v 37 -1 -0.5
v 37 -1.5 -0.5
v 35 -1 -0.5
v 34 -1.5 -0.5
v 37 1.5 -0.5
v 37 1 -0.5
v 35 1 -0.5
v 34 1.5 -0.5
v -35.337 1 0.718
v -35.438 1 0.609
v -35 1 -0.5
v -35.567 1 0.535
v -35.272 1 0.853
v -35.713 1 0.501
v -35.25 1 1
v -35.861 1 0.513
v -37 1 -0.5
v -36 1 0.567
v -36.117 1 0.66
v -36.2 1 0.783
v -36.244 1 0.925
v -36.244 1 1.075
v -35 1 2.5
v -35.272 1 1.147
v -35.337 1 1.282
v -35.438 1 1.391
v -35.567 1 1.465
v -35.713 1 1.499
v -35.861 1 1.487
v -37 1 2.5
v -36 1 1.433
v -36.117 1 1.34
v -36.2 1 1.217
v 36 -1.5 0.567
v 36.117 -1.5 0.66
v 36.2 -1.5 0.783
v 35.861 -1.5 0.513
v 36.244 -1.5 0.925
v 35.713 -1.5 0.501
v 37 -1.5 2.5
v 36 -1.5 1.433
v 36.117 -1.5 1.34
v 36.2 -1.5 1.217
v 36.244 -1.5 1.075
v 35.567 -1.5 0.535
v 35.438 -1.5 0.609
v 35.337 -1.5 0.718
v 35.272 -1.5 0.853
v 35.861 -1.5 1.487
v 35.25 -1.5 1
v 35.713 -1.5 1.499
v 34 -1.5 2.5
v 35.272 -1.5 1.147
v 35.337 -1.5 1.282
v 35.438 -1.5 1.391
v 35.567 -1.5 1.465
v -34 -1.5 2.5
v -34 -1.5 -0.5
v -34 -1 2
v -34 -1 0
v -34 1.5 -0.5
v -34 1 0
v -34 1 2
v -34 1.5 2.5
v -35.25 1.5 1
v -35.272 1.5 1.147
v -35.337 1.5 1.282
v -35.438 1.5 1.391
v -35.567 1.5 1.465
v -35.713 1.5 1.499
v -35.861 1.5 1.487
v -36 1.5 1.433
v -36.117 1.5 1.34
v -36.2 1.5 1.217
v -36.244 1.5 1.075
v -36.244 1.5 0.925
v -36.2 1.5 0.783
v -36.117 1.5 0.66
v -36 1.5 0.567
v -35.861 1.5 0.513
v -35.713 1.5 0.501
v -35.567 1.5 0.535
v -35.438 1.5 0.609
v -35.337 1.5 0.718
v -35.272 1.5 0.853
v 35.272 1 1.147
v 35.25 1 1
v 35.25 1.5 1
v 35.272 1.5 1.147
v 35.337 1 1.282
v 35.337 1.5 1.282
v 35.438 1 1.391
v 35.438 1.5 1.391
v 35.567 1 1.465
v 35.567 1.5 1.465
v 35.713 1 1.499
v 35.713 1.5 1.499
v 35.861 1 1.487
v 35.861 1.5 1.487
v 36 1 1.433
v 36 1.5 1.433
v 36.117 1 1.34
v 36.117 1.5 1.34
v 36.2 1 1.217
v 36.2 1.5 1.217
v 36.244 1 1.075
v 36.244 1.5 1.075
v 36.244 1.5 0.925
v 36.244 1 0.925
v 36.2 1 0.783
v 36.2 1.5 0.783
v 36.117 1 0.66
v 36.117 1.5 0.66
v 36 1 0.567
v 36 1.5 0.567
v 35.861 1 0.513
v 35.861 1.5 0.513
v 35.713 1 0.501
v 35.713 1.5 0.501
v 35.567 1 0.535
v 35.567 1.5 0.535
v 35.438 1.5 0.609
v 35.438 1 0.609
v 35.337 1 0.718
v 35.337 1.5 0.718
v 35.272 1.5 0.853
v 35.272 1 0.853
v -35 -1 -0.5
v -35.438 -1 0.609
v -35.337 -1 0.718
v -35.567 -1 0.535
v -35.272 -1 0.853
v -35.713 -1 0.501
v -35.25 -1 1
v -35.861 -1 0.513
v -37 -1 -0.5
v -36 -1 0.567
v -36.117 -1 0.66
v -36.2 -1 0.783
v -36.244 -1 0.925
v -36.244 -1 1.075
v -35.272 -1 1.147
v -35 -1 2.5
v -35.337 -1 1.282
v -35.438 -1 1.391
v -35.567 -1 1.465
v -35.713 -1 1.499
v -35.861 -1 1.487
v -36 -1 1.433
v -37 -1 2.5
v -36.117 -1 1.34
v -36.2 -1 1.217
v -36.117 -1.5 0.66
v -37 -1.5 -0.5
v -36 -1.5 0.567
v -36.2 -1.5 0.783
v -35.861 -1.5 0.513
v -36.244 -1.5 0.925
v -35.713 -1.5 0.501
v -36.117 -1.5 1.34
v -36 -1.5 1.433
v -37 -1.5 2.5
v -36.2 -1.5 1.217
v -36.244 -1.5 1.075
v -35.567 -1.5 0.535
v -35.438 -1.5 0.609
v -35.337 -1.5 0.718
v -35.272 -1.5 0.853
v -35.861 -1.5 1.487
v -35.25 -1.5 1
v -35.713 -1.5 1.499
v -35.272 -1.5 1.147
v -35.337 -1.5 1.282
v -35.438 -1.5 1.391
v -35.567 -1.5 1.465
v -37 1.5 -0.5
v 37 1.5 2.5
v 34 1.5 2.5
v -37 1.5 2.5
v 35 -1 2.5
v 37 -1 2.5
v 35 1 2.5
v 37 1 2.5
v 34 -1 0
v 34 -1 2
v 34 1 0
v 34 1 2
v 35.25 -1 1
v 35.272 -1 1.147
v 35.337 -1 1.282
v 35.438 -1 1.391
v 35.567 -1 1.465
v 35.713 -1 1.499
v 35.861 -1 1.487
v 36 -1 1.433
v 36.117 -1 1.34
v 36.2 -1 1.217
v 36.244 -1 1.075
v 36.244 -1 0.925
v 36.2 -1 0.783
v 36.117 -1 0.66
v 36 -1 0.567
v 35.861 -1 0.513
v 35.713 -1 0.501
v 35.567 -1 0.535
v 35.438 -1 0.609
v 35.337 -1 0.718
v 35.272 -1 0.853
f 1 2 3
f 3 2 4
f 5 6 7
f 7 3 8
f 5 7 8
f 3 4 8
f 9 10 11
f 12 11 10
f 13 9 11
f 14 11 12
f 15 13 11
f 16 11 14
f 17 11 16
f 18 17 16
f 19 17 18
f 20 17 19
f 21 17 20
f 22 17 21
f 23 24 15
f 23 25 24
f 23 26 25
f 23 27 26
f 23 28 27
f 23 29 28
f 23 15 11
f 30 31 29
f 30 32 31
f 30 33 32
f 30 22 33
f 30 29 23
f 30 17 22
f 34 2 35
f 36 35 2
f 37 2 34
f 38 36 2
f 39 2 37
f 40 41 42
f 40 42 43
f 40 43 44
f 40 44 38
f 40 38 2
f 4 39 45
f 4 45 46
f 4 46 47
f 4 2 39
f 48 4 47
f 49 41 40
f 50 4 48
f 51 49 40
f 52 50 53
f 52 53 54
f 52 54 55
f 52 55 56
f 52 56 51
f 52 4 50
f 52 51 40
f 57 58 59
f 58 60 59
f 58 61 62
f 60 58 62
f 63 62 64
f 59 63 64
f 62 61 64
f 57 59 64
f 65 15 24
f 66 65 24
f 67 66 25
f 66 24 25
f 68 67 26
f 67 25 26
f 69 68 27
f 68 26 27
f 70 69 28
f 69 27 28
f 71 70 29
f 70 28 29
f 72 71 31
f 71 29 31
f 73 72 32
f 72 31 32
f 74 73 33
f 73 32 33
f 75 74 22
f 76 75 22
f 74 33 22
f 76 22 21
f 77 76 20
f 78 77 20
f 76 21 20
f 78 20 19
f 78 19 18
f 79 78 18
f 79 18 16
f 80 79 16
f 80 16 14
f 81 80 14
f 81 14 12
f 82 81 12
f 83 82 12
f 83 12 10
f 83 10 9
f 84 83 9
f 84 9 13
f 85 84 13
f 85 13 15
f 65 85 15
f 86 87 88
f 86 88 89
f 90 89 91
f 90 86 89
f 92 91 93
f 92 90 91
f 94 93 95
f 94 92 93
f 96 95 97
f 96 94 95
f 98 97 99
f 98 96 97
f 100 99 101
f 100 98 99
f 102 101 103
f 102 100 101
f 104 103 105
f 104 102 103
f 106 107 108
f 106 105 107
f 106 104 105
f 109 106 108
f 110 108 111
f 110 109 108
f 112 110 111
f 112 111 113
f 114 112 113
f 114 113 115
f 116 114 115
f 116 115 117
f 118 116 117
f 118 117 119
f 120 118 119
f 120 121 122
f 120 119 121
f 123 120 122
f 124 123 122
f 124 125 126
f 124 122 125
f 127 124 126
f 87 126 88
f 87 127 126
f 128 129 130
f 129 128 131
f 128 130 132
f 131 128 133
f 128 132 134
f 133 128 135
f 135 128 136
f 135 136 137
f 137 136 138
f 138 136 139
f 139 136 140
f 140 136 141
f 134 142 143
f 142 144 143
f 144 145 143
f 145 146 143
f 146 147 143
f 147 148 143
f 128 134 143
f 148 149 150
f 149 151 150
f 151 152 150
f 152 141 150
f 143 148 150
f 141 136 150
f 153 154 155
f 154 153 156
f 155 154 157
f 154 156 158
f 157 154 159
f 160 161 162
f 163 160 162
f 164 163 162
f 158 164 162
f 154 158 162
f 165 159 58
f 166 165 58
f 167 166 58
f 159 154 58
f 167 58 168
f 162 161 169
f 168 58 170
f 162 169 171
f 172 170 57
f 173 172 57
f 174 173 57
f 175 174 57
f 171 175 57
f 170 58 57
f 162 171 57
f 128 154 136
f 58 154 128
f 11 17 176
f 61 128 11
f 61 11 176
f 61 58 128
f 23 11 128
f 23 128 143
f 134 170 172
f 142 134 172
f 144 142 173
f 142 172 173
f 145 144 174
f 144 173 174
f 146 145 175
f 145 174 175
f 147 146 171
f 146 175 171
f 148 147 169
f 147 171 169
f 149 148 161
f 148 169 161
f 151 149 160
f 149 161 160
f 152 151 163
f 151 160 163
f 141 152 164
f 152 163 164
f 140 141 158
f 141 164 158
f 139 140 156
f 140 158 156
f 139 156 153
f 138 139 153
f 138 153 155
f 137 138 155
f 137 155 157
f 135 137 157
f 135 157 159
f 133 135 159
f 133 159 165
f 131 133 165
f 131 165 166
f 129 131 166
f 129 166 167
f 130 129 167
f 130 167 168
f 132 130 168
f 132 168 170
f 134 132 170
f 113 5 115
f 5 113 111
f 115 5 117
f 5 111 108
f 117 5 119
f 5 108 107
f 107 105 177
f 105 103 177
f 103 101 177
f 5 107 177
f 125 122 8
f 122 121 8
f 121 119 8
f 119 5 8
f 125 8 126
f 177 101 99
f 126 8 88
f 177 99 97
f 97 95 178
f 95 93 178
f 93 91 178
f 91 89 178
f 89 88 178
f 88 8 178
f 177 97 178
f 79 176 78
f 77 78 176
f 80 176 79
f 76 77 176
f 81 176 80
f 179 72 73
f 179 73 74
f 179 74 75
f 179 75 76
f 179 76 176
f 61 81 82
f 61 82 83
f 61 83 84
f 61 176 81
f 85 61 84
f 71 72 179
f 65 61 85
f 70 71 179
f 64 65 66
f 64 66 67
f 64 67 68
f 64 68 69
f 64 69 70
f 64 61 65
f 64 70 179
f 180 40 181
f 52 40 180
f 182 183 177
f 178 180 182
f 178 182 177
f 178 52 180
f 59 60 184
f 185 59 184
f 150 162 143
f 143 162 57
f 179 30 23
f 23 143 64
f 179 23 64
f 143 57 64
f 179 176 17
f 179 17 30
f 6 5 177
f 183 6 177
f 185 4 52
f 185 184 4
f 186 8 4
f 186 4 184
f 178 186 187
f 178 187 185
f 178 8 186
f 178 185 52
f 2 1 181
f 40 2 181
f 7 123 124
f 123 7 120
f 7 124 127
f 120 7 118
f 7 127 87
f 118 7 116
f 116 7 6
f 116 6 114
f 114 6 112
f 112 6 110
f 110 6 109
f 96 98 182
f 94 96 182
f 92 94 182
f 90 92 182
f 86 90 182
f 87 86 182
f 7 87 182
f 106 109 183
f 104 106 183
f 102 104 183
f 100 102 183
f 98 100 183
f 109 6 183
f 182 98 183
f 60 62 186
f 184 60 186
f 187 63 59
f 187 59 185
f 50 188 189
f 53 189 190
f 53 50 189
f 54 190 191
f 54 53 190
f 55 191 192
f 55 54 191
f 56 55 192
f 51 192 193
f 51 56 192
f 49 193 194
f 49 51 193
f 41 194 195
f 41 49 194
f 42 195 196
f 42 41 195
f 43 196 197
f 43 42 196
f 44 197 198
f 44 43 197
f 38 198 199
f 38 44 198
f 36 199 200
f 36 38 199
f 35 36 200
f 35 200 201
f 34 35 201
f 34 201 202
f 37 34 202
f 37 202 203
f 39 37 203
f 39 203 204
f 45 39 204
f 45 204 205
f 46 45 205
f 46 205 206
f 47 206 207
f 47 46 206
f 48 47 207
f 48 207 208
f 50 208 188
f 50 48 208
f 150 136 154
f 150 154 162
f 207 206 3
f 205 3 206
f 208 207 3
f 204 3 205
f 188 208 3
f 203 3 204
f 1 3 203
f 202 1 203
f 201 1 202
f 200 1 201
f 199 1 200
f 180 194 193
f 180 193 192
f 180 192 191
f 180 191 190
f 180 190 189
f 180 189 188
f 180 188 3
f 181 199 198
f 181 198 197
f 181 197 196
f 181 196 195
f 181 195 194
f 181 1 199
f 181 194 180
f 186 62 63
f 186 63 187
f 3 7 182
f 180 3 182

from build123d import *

# Parameters (mm, degrees)
IZIM1_W                     = 68
IZIM1_H                     = 2
Y_KSEKLIK_EKSTR_ZYON1_DEPTH = 2
IZIM2_W                     = 3
IZIM2_H                     = 3
Y_KSEKLIK_EKSTR_ZYON2_DEPTH = 3
IZIM3_W                     = 4.320543075
IZIM3_H                     = 2
KES_EKSTR_ZYON2_DEPTH       = 2
IZIM4_R                     = 0.5
KES_EKSTR_ZYON3_DEPTH       = 4


with BuildPart() as part:
    # Çizim1 → Yükseklik-Ekstrüzyon1 (new body)
    with BuildSketch(Plane.XY):
        Rectangle(IZIM1_W, IZIM1_H)
    extrude(amount=Y_KSEKLIK_EKSTR_ZYON1_DEPTH)

    # Çizim2 → Yükseklik-Ekstrüzyon2 (add)
    with BuildSketch(Plane.ZY.offset(34)):
        with Locations((1, 0)):
            Rectangle(IZIM2_W, IZIM2_H)
    y_kseklik_ekstr_zyon2 = extrude(amount=Y_KSEKLIK_EKSTR_ZYON2_DEPTH)

    # Çizim3 → Kes-Ekstrüzyon2 (cut)
    with BuildSketch(Plane.ZY.offset(37)):
        with Locations((1.085555309, 0)):
            Rectangle(IZIM3_W, IZIM3_H)
    kes_ekstr_zyon2 = extrude(amount=-KES_EKSTR_ZYON2_DEPTH, mode=Mode.SUBTRACT)

    # Çizim4 → Kes-Ekstrüzyon3 (cut)
    with BuildSketch(Plane.XZ.offset(1.5)):
        with Locations((-35.75, 1)):
            Circle(IZIM4_R)
    kes_ekstr_zyon3 = extrude(amount=-KES_EKSTR_ZYON3_DEPTH, mode=Mode.SUBTRACT)

    # Aynalama2: Yükseklik-Ekstrüzyon2, Kes-Ekstrüzyon2, Kes-Ekstrüzyon3 across plane
    add(y_kseklik_ekstr_zyon2.mirror(Plane(origin=(0, 0, 0), x_dir=(0, 0, 1), z_dir=(1, 0, 0))))
    add(kes_ekstr_zyon2.mirror(Plane(origin=(0, 0, 0), x_dir=(0, 0, 1), z_dir=(1, 0, 0))), mode=Mode.SUBTRACT)
    add(kes_ekstr_zyon3.mirror(Plane(origin=(0, 0, 0), x_dir=(0, 0, 1), z_dir=(1, 0, 0))), mode=Mode.SUBTRACT)


solid = part.part
